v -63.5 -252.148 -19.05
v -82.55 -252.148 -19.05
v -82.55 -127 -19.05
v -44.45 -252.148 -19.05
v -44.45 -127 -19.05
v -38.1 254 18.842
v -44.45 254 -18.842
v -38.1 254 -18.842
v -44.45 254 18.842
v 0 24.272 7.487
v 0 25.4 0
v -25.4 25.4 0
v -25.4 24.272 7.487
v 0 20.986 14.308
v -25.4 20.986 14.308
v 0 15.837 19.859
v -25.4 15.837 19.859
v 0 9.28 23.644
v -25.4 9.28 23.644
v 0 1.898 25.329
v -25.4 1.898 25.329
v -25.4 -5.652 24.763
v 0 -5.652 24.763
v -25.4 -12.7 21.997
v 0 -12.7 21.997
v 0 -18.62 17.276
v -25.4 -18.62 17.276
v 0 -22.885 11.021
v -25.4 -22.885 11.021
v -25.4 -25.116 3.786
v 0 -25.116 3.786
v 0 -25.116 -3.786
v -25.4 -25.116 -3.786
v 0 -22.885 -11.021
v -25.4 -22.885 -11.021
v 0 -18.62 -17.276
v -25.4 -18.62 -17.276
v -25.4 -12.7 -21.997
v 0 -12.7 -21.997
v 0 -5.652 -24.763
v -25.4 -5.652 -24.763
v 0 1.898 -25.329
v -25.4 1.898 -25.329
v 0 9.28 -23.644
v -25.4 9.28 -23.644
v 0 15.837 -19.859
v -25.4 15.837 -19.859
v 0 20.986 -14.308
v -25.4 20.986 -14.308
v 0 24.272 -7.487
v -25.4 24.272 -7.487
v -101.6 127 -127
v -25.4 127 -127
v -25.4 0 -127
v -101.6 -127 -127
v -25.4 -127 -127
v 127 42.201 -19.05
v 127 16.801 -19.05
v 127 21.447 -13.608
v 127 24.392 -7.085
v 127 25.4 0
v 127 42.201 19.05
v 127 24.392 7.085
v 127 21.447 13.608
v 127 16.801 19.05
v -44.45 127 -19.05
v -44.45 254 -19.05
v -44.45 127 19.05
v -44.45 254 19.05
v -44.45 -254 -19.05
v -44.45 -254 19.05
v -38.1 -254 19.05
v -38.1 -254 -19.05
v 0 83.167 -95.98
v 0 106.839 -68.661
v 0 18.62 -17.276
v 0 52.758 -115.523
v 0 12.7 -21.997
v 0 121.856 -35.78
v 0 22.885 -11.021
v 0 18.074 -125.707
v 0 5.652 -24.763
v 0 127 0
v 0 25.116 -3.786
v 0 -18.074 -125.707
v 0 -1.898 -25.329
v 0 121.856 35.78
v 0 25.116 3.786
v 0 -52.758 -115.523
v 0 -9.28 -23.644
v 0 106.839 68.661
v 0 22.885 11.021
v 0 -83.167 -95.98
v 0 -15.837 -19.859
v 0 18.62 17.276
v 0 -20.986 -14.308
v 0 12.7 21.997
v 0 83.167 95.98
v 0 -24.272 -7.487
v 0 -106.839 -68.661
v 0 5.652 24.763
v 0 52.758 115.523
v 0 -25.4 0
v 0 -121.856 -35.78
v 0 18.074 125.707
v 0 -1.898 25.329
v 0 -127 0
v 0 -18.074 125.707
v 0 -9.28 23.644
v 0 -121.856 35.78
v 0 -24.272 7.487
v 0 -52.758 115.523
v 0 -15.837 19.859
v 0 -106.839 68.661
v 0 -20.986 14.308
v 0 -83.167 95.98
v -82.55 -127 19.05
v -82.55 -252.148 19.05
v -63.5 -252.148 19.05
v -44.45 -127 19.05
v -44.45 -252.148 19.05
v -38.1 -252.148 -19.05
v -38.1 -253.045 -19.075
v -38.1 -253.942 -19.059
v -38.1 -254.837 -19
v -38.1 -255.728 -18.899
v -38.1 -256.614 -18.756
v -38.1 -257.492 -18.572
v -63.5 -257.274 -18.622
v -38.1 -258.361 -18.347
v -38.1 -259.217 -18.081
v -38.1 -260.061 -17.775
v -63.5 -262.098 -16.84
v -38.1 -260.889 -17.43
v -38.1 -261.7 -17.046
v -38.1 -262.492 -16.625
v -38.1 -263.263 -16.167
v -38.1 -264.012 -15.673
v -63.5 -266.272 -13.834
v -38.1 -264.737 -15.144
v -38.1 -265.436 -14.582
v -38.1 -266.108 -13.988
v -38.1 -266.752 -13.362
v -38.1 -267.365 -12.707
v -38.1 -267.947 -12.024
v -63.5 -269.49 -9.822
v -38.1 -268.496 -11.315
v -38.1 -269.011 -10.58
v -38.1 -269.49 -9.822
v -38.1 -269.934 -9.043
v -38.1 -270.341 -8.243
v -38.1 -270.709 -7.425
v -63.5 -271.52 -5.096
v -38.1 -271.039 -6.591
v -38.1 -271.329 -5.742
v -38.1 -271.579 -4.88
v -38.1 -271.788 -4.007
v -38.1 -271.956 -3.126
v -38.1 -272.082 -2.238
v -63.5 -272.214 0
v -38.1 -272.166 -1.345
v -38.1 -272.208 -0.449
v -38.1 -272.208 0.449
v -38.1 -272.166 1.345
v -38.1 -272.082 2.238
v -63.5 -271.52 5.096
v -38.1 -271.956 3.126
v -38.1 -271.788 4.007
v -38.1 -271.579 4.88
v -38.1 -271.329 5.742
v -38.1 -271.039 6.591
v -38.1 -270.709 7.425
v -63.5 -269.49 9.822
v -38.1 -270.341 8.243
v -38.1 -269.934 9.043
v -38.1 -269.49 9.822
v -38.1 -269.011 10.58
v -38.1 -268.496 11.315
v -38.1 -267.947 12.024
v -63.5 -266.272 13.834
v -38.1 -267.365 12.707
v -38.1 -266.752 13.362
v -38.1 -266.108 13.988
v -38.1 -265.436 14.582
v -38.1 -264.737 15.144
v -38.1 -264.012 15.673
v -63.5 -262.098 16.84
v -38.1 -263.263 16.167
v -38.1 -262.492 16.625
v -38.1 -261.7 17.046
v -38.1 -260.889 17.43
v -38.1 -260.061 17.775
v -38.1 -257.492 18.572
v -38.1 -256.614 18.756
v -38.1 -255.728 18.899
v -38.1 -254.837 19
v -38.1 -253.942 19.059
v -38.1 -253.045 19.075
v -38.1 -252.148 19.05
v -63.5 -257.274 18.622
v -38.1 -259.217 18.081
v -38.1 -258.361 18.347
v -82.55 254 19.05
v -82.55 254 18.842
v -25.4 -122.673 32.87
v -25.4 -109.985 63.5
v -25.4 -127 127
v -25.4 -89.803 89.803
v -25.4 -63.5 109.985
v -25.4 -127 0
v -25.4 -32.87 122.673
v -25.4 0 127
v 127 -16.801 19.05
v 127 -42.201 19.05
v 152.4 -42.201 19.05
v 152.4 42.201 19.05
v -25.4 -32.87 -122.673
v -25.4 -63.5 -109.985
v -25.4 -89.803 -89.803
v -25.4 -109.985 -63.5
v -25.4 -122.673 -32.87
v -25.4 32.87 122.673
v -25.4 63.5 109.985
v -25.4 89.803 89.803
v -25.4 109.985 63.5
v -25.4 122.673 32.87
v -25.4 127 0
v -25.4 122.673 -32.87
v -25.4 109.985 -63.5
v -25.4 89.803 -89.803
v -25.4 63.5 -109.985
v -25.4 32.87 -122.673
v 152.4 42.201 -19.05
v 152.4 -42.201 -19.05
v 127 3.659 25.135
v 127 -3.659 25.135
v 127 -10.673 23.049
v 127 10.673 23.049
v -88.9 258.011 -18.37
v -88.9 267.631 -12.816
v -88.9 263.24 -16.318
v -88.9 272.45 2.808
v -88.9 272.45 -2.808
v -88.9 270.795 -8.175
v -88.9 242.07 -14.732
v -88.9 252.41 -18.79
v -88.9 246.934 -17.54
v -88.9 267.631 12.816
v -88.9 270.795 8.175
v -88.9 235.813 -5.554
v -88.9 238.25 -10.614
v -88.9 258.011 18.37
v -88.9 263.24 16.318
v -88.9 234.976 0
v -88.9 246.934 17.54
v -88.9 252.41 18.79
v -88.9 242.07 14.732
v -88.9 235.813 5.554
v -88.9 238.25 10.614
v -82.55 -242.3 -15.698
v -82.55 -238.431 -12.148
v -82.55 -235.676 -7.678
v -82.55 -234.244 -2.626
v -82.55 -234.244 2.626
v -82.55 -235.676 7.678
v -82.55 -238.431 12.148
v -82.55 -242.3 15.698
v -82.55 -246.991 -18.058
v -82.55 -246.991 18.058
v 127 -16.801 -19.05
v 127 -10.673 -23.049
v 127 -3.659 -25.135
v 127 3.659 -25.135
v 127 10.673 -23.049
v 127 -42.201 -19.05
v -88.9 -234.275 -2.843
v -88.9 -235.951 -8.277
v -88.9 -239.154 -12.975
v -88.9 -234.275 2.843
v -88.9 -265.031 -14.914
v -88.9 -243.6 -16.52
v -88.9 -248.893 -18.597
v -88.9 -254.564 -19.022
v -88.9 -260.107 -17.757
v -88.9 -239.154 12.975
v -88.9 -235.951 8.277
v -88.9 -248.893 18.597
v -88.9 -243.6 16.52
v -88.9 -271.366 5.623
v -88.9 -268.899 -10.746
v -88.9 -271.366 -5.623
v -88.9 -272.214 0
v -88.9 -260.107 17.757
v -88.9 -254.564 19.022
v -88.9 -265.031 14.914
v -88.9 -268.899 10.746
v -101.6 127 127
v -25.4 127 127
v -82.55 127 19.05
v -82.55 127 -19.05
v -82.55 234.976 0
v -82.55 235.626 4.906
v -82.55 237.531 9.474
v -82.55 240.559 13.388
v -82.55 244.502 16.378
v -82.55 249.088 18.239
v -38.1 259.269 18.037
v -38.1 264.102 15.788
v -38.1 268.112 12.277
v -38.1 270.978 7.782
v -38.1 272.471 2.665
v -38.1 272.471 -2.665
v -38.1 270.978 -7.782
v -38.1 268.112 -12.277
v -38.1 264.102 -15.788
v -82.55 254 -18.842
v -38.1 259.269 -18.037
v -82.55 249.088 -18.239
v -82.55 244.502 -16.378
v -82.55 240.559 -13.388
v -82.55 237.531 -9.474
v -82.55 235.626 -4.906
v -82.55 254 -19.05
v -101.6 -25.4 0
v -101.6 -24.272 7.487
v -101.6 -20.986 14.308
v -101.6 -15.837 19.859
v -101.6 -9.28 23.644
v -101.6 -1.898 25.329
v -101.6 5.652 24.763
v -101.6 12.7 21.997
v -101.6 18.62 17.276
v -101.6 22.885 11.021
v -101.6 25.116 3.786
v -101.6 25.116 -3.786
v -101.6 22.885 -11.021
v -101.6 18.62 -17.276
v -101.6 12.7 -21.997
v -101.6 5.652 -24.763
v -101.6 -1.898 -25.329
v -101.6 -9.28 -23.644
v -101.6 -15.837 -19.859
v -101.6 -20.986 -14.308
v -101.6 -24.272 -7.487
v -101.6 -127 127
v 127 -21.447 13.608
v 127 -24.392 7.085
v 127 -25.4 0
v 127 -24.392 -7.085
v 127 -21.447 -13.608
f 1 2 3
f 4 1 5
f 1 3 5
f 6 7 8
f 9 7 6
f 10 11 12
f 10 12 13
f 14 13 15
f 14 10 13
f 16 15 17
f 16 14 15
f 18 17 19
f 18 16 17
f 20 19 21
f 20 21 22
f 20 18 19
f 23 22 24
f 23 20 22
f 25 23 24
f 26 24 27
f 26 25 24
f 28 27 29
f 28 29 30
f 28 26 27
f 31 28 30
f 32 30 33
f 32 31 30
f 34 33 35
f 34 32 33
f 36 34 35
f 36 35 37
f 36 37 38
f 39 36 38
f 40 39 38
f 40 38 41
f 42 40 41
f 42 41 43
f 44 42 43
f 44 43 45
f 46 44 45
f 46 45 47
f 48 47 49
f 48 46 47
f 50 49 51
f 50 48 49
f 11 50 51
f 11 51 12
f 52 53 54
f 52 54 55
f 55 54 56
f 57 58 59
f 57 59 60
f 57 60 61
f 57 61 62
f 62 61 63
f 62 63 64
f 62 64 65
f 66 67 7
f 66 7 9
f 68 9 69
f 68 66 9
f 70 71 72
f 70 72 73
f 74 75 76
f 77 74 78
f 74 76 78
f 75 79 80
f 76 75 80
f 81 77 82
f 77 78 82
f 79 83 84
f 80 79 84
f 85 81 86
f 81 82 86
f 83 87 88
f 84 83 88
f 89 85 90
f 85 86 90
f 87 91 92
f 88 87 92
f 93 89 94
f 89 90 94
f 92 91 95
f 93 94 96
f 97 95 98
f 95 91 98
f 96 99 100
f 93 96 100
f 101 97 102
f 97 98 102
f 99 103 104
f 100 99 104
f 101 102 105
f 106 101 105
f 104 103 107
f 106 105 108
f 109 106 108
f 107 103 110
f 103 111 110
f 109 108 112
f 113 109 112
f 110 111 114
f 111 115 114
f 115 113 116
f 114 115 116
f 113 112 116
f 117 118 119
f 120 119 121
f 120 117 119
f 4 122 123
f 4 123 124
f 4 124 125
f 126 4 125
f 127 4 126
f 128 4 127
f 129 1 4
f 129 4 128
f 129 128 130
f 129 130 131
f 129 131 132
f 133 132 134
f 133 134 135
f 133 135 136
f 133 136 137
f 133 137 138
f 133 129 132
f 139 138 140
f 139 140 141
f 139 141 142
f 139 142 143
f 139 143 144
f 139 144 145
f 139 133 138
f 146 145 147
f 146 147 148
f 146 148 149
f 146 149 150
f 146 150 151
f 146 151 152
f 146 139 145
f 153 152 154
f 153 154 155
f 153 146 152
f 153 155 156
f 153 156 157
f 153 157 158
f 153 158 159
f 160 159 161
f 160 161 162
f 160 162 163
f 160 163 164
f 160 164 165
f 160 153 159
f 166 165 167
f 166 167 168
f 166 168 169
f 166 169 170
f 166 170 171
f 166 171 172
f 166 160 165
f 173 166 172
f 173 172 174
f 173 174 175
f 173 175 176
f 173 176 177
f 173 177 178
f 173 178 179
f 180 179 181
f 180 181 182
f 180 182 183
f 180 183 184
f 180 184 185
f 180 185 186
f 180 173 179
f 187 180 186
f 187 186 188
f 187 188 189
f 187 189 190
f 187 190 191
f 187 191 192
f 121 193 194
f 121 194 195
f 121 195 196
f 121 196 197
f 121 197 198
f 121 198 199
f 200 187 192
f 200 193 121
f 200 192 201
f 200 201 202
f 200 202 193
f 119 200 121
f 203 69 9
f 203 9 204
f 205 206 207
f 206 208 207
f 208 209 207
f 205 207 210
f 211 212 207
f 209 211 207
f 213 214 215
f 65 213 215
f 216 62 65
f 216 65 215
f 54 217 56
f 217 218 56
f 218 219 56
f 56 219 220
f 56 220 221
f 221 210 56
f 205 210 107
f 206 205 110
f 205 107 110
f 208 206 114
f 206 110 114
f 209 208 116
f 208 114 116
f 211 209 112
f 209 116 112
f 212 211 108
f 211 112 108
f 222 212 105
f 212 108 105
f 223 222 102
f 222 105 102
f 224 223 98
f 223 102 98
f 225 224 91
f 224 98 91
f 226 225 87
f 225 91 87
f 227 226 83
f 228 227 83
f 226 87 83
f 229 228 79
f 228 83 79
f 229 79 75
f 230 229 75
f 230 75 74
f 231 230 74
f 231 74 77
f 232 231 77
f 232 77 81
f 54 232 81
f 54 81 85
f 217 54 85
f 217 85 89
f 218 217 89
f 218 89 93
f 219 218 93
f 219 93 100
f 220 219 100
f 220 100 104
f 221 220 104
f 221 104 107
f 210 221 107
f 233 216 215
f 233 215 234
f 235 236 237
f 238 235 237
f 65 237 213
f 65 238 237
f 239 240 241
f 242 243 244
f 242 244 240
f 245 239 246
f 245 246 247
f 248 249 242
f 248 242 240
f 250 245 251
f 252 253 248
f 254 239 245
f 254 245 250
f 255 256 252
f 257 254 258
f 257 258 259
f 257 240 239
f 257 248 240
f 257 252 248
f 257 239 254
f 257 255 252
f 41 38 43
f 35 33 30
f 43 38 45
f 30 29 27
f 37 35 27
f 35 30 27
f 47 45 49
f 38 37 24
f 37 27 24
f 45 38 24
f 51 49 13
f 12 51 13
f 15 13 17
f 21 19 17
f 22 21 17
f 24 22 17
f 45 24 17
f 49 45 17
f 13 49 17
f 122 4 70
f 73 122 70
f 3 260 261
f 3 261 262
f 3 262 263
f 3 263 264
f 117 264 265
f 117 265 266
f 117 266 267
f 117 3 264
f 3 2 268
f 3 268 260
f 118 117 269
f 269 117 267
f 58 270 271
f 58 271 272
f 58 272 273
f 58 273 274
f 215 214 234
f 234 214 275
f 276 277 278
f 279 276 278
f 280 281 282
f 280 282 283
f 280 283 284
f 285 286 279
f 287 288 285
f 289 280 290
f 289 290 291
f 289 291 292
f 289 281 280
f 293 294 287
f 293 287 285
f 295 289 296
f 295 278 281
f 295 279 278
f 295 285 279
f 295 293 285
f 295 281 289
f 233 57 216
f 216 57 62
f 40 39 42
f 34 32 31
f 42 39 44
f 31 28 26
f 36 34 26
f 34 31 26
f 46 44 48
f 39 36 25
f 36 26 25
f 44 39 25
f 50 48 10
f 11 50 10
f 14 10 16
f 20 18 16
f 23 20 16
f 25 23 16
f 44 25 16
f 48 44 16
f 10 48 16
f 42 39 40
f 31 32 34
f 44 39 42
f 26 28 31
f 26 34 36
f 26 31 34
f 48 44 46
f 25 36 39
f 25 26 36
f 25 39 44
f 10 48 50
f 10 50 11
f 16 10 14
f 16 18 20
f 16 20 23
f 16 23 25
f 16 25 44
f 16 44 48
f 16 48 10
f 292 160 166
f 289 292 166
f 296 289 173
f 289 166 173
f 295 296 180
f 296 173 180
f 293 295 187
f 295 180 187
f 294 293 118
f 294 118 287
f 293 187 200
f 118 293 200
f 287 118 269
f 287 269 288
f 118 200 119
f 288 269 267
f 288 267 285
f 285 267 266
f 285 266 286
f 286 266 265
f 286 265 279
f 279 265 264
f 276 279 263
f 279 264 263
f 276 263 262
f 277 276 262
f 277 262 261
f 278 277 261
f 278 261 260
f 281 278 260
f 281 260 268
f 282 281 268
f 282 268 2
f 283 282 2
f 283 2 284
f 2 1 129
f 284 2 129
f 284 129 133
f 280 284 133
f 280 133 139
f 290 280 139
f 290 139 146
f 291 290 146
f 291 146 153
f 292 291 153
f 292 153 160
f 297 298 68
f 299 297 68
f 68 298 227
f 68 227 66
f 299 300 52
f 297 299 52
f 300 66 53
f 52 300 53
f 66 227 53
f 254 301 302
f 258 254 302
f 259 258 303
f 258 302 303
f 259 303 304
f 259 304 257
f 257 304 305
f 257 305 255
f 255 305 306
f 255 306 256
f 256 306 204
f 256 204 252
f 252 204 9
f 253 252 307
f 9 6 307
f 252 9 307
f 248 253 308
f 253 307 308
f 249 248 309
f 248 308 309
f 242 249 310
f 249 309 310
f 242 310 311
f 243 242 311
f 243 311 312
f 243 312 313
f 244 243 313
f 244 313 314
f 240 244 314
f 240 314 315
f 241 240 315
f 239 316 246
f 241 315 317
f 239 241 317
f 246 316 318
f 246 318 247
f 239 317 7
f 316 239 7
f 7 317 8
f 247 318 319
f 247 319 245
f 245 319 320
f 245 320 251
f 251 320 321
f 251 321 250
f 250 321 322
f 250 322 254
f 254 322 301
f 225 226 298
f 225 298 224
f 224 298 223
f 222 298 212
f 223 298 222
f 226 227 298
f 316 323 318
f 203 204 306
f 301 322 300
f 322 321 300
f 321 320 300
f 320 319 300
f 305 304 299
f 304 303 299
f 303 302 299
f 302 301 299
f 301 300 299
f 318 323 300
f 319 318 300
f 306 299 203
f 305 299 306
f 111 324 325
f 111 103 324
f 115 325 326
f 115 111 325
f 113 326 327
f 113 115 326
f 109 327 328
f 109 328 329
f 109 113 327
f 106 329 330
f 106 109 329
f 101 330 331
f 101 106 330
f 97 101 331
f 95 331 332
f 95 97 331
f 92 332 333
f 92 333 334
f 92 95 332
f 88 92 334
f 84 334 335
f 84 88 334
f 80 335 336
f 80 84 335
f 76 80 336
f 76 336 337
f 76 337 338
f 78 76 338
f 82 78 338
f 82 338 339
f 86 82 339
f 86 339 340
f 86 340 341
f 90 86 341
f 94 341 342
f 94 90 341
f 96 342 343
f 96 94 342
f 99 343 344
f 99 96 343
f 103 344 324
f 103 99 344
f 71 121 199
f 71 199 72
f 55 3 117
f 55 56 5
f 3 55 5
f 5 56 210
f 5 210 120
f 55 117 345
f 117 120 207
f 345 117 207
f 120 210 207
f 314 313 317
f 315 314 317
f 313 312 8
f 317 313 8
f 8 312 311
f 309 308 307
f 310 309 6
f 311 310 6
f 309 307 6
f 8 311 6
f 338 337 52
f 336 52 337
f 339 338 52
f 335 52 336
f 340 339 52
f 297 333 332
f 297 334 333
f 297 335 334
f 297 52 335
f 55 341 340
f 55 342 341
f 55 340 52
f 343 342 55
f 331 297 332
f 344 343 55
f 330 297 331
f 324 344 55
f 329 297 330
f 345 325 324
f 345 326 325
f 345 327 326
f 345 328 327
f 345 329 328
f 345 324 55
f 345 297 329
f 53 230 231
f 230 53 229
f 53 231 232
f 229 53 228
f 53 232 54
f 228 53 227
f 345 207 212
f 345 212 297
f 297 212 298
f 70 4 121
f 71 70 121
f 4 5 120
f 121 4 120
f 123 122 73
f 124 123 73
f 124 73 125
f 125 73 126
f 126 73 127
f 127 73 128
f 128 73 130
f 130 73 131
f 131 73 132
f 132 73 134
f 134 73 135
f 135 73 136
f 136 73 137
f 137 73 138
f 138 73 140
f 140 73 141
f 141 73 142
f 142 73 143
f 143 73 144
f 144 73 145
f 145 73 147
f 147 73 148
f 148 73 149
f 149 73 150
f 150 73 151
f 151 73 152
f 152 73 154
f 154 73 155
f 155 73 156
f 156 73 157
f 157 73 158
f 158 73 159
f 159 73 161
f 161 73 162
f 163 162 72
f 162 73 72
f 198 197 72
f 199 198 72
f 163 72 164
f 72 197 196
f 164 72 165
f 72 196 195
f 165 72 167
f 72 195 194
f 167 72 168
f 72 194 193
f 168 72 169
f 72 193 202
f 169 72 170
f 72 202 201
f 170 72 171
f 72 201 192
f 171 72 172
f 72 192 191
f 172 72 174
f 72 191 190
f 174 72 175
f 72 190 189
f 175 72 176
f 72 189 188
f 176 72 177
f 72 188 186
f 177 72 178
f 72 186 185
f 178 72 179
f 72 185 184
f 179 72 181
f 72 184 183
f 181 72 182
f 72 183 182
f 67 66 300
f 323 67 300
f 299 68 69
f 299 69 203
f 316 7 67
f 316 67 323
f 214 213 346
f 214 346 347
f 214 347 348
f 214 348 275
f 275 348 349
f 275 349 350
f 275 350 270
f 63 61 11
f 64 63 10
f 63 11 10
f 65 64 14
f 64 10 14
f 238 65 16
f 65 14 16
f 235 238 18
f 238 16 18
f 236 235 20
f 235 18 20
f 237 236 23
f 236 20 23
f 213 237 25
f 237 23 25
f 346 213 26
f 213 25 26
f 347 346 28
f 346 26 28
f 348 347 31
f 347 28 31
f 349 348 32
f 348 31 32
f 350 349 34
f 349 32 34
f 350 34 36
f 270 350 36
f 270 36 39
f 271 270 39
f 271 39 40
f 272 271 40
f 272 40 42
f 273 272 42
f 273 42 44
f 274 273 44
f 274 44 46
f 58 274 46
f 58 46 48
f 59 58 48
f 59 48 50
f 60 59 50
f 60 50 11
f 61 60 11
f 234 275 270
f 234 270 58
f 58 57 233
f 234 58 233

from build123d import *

# Parameters (mm, degrees)
F0_R      = 25.4
F1_DEPTH  = 127
F3_DEPTH  = 25.4
F4_DEPTH  = 25.4
F5_DEPTH  = 25.4
F6_R      = 127
F6_R_2    = 25.4
F7_DEPTH  = 25.4
F8_DEPTH  = 25.4
F9_R      = 25.4
F10_DEPTH = 76.2
F11_W     = 38.1
F11_H     = 38.1
F12_DEPTH = 127
F13_W     = 38.1
F13_H     = 38.1
F14_DEPTH = 127
F16_R     = 18.8423860879
F17_DEPTH = 25.4
F18_DEPTH = 25.4
F19_R     = 19.0757078593
F20_DEPTH = 25.4
F21_DEPTH = 25.4


with BuildPart() as f1:
    # F0 (on Right) → F1 (new body)
    with BuildSketch(Plane.YZ):
        Circle(F0_R)
    extrude(amount=F1_DEPTH)

    # F2 (on face) → F3 (join)
    with BuildSketch(Plane.YZ.offset(127)):
        Polygon((16.8005208253, 0), (0, 0), (-16.8005208253, 0), (-16.8005208253, -19.05), (16.8005208253, -19.05), align=None)
        Polygon((-16.8005208253, 0), (0, 0), (16.8005208253, 0), (16.8005208253, 19.05), (-16.8005208253, 19.05), align=None)
    extrude(amount=F3_DEPTH)

    # F4 (add): a face of the model
    f4_faces = [f1.faces().sort_by_distance(p)[0] for p in [
        (139.7, 16.8005208253, 0),
    ]]
    extrude(f4_faces, amount=F4_DEPTH)

    # F5 (add): a face of the model
    f5_faces = [f1.faces().sort_by_distance(p)[0] for p in [
        (139.7, -16.8005208253, 0),
    ]]
    extrude(f5_faces, amount=F5_DEPTH)


with BuildPart() as f7:
    # F6 (on face) → F7 (new body)
    with BuildSketch(Plane(origin=(0, 0, 0), x_dir=(0, -1, 0), z_dir=(-1, 0, 0))):
        Circle(F6_R)
        Circle(F6_R_2, mode=Mode.SUBTRACT)
    extrude(amount=F7_DEPTH)

    # F9 (on face) → F10 (join)
    with BuildSketch(Plane(origin=(-25.4, 0, 0), x_dir=(0, -1, 0), z_dir=(-1, 0, 0))):
        with BuildLine():
            Line((1.902e-07, -127), (127, -127))
            Line((127, -127), (127, 0))
            ThreePointArc((127, 0), (89.8025612779, -89.8025611435), (1.902e-07, -127))
        make_face()
        with BuildLine():
            Line((-127, -127), (1.902e-07, -127))
            ThreePointArc((1.902e-07, -127), (-89.8025611147, -89.8025613067), (-127, -8.12e-08))
            Line((-127, -8.12e-08), (-127, -127))
        make_face()
        with BuildLine():
            ThreePointArc((-127, -8.12e-08), (-89.8025611147, -89.8025613067), (1.902e-07, -127))
            ThreePointArc((1.902e-07, -127), (89.8025612779, -89.8025611435), (127, 0))
            ThreePointArc((127, 0), (89.8025611483, 89.802561273), (-1.763e-07, 127))
            ThreePointArc((-1.763e-07, 127), (-89.8025613018, 89.8025611196), (-127, -8.12e-08))
        make_face()
        Circle(F9_R, mode=Mode.SUBTRACT)
        with BuildLine():
            ThreePointArc((-1.763e-07, 127), (89.8025611483, 89.802561273), (127, 0))
            Line((127, 0), (127, 127))
            Line((127, 127), (-1.763e-07, 127))
        make_face()
        with BuildLine():
            Line((-127, 127), (-127, -8.12e-08))
            ThreePointArc((-127, -8.12e-08), (-89.8025613018, 89.8025611196), (-1.763e-07, 127))
            Line((-1.763e-07, 127), (-127, 127))
        make_face()
    extrude(amount=F10_DEPTH)

    # F11 (on face) → F12 (join)
    with BuildSketch(Plane(origin=(0, 127, 0), x_dir=(-1, 0, 0), z_dir=(0, 1, 0))):
        with Locations((63.5, 0)):
            Rectangle(F11_W, F11_H)
    extrude(amount=F12_DEPTH)

    # F13 (on face) → F14 (join)
    with BuildSketch(Plane.XZ.offset(127)):
        with Locations((-63.5, 0)):
            Rectangle(F13_W, F13_H)
    extrude(amount=F14_DEPTH)

    # F16 (on offset) → F17 (join)
    with BuildSketch(Plane(origin=(-63.5, 0, 0), x_dir=(0, -1, 0), z_dir=(-1, 0, 0))):
        with Locations((-253.818333149, 0)):
            Circle(F16_R)
    extrude(amount=F17_DEPTH)

    # F18 (add): a face of the model
    f18_faces = [f7.faces().sort_by_distance(p)[0] for p in [
        (-63.5, 261.9135488833, 0),
    ]]
    extrude(f18_faces, amount=F18_DEPTH)

    # F19 (on offset) → F20 (join)
    with BuildSketch(Plane(origin=(-63.5, 0, 0), x_dir=(0, -1, 0), z_dir=(-1, 0, 0))):
        with Locations((253.1379759312, 0)):
            Circle(F19_R)
    extrude(amount=F20_DEPTH)

    # F21 (add): a face of the model
    f21_faces = [f7.faces().sort_by_distance(p)[0] for p in [
        (-63.5, -261.7006711899, 0),
    ]]
    extrude(f21_faces, amount=F21_DEPTH)


with BuildPart() as f8:
    # F8 (new): a face of the model
    f8_faces = [f1.part.faces().sort_by_distance(p)[0] for p in [
        (0, 0, 0),
    ]]
    extrude(f8_faces, amount=F8_DEPTH)


solid = Compound([f1.part, f7.part, f8.part])
